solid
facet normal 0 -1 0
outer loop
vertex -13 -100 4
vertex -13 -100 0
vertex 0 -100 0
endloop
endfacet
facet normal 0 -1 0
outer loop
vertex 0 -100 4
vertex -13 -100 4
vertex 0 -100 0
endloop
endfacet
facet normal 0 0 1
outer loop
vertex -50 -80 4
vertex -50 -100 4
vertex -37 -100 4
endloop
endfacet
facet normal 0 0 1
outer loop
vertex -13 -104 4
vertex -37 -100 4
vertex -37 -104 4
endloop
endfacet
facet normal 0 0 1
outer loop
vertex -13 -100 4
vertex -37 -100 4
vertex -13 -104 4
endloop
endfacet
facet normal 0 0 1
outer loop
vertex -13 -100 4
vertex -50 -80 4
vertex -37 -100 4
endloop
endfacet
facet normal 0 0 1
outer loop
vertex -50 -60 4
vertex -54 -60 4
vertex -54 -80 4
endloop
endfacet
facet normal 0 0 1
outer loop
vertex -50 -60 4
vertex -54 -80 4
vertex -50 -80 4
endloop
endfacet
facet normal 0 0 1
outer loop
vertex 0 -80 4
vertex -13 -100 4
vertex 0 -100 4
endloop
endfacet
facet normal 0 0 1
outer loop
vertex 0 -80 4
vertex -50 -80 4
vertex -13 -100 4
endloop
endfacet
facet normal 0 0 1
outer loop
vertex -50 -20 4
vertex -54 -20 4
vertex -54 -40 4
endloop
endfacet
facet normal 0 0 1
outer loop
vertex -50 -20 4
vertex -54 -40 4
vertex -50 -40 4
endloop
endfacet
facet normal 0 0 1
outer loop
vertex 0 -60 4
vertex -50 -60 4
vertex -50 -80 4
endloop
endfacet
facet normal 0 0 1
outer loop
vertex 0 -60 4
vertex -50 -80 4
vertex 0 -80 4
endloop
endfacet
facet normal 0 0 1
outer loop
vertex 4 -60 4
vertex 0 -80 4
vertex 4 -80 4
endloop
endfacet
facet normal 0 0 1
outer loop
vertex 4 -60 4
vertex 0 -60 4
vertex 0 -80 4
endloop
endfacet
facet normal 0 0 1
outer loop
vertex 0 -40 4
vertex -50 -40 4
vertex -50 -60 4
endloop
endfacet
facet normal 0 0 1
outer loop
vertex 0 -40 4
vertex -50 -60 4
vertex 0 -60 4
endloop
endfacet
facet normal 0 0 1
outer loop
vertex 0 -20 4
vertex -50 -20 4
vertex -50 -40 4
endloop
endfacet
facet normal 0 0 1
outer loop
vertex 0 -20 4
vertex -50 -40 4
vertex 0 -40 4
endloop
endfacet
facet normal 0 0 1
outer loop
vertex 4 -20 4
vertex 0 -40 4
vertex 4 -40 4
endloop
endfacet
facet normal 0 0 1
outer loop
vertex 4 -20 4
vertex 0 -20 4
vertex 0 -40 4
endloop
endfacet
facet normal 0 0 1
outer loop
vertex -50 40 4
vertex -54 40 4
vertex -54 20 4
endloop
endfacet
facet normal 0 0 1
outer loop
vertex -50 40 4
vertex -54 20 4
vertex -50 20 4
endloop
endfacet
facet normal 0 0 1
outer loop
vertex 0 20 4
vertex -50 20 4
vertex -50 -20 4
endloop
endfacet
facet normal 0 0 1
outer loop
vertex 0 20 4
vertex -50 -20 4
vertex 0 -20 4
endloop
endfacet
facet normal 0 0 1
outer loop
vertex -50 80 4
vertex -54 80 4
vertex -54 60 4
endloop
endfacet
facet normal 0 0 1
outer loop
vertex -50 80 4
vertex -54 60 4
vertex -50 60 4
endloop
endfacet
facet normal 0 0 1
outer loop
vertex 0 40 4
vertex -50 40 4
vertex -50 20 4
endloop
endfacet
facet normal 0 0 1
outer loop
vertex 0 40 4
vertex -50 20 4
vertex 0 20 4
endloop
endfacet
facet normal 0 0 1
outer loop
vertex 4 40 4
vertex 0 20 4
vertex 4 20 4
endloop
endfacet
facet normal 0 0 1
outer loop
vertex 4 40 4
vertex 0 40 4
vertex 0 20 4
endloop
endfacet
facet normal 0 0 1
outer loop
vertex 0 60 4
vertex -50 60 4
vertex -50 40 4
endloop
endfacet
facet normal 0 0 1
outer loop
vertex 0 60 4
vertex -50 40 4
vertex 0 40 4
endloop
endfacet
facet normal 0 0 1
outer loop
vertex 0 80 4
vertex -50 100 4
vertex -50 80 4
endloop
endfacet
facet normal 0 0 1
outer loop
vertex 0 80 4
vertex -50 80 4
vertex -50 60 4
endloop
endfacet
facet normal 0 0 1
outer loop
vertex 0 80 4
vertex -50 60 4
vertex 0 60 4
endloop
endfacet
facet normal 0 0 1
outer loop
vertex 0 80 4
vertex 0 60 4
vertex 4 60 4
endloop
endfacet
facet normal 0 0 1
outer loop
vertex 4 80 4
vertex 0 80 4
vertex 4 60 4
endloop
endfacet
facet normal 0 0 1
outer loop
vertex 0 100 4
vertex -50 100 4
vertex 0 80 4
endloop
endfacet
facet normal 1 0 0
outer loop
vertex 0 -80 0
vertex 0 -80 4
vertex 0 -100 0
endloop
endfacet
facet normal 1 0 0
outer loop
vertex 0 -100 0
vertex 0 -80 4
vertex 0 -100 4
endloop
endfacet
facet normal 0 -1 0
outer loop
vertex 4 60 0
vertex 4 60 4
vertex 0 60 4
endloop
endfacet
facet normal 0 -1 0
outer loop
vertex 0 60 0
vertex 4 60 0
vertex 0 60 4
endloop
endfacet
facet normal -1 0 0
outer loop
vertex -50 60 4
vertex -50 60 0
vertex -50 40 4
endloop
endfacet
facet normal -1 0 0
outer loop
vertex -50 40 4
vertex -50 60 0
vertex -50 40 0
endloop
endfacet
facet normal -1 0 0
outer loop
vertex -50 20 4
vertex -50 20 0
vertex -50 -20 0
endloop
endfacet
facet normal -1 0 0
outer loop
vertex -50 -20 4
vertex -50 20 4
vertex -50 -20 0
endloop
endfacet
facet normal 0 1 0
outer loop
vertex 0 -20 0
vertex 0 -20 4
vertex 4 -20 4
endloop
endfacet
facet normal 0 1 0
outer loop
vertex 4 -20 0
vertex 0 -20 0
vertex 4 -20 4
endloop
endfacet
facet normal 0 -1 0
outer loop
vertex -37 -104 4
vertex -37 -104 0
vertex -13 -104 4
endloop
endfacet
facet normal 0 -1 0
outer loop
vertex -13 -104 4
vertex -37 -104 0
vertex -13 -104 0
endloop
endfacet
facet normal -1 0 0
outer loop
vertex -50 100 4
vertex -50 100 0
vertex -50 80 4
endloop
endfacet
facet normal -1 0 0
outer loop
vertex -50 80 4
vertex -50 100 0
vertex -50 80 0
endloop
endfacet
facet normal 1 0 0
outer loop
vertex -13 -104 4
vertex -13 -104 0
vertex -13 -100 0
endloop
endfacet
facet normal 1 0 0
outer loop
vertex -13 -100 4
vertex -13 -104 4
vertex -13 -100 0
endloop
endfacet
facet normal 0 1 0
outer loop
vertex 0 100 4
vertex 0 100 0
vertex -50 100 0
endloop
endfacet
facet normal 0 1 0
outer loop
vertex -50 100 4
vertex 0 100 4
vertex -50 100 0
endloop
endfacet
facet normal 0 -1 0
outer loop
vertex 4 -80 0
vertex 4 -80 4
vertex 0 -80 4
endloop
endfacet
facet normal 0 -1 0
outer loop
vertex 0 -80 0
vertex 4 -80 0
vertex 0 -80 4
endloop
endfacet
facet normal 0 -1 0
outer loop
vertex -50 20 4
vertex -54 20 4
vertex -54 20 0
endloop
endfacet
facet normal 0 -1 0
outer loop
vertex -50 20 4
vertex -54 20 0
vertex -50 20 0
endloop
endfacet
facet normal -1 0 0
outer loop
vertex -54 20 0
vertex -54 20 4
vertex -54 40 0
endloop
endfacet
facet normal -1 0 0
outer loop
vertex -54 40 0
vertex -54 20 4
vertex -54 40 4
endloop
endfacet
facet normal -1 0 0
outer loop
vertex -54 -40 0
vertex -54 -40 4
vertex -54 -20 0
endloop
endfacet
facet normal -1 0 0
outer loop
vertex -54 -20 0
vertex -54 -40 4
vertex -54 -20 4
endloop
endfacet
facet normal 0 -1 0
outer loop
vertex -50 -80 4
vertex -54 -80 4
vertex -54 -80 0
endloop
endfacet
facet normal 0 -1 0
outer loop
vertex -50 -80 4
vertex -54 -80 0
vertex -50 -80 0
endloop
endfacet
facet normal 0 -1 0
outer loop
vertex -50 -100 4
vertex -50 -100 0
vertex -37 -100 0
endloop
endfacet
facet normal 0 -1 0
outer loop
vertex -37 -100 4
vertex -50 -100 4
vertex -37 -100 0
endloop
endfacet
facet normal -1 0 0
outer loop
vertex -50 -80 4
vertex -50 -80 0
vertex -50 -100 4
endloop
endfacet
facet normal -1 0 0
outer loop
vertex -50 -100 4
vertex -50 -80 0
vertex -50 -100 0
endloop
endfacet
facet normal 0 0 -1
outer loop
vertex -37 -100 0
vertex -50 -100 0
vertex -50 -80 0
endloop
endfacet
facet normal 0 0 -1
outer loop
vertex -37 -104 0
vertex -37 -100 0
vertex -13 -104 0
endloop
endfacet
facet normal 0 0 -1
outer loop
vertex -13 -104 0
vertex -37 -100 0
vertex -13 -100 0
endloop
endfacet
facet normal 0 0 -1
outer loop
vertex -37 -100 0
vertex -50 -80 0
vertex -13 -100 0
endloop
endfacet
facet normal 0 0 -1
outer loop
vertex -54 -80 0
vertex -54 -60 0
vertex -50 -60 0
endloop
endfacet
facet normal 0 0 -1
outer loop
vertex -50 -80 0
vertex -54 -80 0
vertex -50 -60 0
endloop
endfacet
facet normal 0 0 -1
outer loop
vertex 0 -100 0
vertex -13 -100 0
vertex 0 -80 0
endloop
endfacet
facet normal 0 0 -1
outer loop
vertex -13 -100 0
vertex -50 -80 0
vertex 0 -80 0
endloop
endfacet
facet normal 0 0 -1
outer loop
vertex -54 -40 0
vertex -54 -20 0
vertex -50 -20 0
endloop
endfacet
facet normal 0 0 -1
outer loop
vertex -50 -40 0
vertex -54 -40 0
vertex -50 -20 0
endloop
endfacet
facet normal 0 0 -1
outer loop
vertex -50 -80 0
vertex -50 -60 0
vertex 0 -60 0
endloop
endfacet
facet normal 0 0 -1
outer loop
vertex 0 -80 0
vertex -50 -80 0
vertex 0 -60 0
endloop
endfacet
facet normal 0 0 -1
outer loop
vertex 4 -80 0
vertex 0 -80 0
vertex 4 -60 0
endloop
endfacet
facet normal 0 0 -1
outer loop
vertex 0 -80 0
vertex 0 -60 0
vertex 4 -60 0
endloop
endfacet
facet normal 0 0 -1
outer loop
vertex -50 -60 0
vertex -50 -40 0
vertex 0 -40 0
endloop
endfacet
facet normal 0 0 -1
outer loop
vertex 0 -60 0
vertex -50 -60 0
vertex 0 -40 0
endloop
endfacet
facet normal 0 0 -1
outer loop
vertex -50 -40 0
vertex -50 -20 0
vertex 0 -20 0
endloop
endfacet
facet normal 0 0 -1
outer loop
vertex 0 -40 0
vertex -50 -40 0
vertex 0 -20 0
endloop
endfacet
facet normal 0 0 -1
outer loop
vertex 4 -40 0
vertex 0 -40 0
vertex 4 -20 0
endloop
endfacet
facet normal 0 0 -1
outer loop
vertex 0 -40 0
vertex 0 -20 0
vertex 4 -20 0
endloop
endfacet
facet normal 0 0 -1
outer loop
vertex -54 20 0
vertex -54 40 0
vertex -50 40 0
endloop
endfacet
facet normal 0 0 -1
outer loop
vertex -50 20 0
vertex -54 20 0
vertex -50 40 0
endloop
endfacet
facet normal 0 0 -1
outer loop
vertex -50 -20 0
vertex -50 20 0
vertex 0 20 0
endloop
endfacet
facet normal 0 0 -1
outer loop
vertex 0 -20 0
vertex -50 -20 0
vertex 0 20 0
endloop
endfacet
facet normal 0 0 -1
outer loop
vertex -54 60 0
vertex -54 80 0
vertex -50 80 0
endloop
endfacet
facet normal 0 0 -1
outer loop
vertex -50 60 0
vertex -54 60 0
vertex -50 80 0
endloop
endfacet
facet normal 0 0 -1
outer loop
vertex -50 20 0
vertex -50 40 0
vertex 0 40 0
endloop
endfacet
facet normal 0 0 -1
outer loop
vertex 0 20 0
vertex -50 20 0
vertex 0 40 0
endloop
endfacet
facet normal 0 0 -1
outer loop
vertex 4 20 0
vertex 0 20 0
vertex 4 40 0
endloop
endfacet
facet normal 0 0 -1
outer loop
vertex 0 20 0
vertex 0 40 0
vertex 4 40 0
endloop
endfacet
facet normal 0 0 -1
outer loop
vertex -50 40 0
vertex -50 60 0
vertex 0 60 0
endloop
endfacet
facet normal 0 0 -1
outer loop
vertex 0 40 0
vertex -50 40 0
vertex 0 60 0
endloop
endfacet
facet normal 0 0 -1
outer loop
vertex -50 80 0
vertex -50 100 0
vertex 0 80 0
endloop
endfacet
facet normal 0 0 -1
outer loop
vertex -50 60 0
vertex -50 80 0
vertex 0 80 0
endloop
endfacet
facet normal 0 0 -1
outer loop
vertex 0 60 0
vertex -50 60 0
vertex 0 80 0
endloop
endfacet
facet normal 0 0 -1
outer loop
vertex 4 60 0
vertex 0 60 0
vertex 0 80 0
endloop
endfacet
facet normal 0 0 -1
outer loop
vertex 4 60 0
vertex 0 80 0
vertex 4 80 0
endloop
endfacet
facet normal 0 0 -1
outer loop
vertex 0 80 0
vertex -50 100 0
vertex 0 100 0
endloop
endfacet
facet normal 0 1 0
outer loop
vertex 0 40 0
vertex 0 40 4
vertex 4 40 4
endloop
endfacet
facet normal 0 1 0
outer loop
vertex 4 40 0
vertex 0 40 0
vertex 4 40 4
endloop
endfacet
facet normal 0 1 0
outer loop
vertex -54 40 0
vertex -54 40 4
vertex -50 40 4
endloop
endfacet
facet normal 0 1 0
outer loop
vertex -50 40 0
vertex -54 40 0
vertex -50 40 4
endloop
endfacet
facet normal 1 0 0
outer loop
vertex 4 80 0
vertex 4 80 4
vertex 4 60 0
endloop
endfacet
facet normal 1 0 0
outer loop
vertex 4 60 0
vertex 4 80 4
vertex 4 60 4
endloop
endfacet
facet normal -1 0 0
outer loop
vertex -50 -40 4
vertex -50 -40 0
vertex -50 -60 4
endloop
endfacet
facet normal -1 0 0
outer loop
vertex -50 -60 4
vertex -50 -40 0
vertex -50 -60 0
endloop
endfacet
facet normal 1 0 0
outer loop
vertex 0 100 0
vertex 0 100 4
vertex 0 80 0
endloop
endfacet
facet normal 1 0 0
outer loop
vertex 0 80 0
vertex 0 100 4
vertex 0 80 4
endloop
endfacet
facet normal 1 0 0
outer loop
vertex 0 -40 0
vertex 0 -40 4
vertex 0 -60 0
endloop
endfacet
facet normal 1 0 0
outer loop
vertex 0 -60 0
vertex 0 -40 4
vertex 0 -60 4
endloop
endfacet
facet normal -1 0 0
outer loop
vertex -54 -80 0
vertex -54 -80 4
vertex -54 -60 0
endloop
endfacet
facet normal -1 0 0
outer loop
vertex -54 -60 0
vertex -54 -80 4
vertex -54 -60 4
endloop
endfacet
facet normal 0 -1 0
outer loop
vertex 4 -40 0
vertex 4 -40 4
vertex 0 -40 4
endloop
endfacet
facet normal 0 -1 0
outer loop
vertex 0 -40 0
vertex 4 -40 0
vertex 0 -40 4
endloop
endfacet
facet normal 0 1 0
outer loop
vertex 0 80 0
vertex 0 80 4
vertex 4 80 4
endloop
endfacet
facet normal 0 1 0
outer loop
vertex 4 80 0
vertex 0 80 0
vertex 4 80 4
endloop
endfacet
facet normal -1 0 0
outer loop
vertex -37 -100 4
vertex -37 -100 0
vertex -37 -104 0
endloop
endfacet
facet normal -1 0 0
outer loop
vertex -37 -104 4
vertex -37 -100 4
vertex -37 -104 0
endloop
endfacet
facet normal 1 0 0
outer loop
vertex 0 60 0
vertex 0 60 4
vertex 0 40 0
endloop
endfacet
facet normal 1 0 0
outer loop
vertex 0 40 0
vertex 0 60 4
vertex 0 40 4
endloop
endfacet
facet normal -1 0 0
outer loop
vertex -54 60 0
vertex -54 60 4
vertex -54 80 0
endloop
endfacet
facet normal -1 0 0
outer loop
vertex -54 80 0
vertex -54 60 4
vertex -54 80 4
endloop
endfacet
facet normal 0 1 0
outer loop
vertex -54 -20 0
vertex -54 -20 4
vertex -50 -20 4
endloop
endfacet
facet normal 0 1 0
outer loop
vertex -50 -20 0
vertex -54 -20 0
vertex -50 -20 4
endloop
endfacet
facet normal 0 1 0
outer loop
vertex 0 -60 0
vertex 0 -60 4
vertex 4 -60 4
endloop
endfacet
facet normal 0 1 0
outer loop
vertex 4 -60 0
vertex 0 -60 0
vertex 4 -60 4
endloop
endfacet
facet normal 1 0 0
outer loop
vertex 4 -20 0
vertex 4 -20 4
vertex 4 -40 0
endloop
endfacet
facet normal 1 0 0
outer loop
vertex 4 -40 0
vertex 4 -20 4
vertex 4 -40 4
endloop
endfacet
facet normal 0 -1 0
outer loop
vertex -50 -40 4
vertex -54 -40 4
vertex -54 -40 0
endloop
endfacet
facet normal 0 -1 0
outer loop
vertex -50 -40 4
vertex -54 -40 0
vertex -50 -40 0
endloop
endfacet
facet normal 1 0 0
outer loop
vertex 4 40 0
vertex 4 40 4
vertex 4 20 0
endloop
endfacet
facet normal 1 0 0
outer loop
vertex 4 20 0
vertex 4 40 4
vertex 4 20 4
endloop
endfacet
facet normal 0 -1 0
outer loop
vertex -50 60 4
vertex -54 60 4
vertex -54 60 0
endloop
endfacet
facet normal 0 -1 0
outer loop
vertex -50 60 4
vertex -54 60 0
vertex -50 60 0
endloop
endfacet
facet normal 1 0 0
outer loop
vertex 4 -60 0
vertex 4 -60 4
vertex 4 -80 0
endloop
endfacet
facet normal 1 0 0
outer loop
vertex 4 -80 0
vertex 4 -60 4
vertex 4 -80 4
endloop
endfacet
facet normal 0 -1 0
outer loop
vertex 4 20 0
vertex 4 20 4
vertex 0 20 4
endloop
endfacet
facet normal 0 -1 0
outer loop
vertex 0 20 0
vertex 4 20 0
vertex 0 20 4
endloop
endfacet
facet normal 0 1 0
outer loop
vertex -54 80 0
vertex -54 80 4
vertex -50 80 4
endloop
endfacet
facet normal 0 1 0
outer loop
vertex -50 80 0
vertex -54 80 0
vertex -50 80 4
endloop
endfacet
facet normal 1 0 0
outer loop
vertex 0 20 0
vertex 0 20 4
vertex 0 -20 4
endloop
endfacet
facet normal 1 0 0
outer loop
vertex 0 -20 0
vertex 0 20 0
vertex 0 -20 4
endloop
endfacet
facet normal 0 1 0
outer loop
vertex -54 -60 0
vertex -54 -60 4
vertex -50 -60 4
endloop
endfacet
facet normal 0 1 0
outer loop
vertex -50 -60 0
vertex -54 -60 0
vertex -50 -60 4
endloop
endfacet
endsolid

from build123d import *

# Parameters (mm, degrees)
RESSALTO_EXTRUS_O1_DEPTH = 4
CORTE_EXTRUS_O3_DEPTH    = 116.464280191
ESBO_O4_W                = 4
ESBO_O4_H                = 20
RESSALTO_EXTRUS_O2_DEPTH = 4


with BuildPart() as part:
    # Esboço1 → Ressalto-extrusão1 (new body)
    with BuildSketch(Plane.XY):
        Polygon((-50, -100), (-37, -100), (-37, -104), (-13, -104), (-13, -100), (13, -100), (13, -104), (37, -104), (37, -100), (50, -100), (50, 100), (-50, 100), align=None)
    extrude(amount=RESSALTO_EXTRUS_O1_DEPTH)

    # Esboço2 → Corte-extrusão3 (cut, through all)
    with BuildSketch(Plane.XY.offset(4)):
        Polygon((0, 20), (0, 0), (50, 0), (50, 100), (0, 100), (0, 80), (4, 80), (4, 60), (0, 60), (0, 40), (4, 40), (4, 20), align=None)
        Polygon((0, -80), (0, -100), (13, -100), (13, -104), (37, -104), (37, -100), (50, -100), (50, 0), (0, 0), (0, -20), (4, -20), (4, -40), (0, -40), (0, -60), (4, -60), (4, -80), align=None)
    extrude(amount=-CORTE_EXTRUS_O3_DEPTH, mode=Mode.SUBTRACT)

    # Esboço4 → Ressalto-extrusão2 (add)
    with BuildSketch(Plane.XY.offset(4)):
        with Locations((-52, 70)):
            Rectangle(ESBO_O4_W, ESBO_O4_H)
        with Locations((-52, 30)):
            Rectangle(ESBO_O4_W, ESBO_O4_H)
        with Locations((-52, -70)):
            Rectangle(ESBO_O4_W, ESBO_O4_H)
        with Locations((-52, -30)):
            Rectangle(ESBO_O4_W, ESBO_O4_H)
    extrude(amount=-RESSALTO_EXTRUS_O2_DEPTH)


solid = part.part
